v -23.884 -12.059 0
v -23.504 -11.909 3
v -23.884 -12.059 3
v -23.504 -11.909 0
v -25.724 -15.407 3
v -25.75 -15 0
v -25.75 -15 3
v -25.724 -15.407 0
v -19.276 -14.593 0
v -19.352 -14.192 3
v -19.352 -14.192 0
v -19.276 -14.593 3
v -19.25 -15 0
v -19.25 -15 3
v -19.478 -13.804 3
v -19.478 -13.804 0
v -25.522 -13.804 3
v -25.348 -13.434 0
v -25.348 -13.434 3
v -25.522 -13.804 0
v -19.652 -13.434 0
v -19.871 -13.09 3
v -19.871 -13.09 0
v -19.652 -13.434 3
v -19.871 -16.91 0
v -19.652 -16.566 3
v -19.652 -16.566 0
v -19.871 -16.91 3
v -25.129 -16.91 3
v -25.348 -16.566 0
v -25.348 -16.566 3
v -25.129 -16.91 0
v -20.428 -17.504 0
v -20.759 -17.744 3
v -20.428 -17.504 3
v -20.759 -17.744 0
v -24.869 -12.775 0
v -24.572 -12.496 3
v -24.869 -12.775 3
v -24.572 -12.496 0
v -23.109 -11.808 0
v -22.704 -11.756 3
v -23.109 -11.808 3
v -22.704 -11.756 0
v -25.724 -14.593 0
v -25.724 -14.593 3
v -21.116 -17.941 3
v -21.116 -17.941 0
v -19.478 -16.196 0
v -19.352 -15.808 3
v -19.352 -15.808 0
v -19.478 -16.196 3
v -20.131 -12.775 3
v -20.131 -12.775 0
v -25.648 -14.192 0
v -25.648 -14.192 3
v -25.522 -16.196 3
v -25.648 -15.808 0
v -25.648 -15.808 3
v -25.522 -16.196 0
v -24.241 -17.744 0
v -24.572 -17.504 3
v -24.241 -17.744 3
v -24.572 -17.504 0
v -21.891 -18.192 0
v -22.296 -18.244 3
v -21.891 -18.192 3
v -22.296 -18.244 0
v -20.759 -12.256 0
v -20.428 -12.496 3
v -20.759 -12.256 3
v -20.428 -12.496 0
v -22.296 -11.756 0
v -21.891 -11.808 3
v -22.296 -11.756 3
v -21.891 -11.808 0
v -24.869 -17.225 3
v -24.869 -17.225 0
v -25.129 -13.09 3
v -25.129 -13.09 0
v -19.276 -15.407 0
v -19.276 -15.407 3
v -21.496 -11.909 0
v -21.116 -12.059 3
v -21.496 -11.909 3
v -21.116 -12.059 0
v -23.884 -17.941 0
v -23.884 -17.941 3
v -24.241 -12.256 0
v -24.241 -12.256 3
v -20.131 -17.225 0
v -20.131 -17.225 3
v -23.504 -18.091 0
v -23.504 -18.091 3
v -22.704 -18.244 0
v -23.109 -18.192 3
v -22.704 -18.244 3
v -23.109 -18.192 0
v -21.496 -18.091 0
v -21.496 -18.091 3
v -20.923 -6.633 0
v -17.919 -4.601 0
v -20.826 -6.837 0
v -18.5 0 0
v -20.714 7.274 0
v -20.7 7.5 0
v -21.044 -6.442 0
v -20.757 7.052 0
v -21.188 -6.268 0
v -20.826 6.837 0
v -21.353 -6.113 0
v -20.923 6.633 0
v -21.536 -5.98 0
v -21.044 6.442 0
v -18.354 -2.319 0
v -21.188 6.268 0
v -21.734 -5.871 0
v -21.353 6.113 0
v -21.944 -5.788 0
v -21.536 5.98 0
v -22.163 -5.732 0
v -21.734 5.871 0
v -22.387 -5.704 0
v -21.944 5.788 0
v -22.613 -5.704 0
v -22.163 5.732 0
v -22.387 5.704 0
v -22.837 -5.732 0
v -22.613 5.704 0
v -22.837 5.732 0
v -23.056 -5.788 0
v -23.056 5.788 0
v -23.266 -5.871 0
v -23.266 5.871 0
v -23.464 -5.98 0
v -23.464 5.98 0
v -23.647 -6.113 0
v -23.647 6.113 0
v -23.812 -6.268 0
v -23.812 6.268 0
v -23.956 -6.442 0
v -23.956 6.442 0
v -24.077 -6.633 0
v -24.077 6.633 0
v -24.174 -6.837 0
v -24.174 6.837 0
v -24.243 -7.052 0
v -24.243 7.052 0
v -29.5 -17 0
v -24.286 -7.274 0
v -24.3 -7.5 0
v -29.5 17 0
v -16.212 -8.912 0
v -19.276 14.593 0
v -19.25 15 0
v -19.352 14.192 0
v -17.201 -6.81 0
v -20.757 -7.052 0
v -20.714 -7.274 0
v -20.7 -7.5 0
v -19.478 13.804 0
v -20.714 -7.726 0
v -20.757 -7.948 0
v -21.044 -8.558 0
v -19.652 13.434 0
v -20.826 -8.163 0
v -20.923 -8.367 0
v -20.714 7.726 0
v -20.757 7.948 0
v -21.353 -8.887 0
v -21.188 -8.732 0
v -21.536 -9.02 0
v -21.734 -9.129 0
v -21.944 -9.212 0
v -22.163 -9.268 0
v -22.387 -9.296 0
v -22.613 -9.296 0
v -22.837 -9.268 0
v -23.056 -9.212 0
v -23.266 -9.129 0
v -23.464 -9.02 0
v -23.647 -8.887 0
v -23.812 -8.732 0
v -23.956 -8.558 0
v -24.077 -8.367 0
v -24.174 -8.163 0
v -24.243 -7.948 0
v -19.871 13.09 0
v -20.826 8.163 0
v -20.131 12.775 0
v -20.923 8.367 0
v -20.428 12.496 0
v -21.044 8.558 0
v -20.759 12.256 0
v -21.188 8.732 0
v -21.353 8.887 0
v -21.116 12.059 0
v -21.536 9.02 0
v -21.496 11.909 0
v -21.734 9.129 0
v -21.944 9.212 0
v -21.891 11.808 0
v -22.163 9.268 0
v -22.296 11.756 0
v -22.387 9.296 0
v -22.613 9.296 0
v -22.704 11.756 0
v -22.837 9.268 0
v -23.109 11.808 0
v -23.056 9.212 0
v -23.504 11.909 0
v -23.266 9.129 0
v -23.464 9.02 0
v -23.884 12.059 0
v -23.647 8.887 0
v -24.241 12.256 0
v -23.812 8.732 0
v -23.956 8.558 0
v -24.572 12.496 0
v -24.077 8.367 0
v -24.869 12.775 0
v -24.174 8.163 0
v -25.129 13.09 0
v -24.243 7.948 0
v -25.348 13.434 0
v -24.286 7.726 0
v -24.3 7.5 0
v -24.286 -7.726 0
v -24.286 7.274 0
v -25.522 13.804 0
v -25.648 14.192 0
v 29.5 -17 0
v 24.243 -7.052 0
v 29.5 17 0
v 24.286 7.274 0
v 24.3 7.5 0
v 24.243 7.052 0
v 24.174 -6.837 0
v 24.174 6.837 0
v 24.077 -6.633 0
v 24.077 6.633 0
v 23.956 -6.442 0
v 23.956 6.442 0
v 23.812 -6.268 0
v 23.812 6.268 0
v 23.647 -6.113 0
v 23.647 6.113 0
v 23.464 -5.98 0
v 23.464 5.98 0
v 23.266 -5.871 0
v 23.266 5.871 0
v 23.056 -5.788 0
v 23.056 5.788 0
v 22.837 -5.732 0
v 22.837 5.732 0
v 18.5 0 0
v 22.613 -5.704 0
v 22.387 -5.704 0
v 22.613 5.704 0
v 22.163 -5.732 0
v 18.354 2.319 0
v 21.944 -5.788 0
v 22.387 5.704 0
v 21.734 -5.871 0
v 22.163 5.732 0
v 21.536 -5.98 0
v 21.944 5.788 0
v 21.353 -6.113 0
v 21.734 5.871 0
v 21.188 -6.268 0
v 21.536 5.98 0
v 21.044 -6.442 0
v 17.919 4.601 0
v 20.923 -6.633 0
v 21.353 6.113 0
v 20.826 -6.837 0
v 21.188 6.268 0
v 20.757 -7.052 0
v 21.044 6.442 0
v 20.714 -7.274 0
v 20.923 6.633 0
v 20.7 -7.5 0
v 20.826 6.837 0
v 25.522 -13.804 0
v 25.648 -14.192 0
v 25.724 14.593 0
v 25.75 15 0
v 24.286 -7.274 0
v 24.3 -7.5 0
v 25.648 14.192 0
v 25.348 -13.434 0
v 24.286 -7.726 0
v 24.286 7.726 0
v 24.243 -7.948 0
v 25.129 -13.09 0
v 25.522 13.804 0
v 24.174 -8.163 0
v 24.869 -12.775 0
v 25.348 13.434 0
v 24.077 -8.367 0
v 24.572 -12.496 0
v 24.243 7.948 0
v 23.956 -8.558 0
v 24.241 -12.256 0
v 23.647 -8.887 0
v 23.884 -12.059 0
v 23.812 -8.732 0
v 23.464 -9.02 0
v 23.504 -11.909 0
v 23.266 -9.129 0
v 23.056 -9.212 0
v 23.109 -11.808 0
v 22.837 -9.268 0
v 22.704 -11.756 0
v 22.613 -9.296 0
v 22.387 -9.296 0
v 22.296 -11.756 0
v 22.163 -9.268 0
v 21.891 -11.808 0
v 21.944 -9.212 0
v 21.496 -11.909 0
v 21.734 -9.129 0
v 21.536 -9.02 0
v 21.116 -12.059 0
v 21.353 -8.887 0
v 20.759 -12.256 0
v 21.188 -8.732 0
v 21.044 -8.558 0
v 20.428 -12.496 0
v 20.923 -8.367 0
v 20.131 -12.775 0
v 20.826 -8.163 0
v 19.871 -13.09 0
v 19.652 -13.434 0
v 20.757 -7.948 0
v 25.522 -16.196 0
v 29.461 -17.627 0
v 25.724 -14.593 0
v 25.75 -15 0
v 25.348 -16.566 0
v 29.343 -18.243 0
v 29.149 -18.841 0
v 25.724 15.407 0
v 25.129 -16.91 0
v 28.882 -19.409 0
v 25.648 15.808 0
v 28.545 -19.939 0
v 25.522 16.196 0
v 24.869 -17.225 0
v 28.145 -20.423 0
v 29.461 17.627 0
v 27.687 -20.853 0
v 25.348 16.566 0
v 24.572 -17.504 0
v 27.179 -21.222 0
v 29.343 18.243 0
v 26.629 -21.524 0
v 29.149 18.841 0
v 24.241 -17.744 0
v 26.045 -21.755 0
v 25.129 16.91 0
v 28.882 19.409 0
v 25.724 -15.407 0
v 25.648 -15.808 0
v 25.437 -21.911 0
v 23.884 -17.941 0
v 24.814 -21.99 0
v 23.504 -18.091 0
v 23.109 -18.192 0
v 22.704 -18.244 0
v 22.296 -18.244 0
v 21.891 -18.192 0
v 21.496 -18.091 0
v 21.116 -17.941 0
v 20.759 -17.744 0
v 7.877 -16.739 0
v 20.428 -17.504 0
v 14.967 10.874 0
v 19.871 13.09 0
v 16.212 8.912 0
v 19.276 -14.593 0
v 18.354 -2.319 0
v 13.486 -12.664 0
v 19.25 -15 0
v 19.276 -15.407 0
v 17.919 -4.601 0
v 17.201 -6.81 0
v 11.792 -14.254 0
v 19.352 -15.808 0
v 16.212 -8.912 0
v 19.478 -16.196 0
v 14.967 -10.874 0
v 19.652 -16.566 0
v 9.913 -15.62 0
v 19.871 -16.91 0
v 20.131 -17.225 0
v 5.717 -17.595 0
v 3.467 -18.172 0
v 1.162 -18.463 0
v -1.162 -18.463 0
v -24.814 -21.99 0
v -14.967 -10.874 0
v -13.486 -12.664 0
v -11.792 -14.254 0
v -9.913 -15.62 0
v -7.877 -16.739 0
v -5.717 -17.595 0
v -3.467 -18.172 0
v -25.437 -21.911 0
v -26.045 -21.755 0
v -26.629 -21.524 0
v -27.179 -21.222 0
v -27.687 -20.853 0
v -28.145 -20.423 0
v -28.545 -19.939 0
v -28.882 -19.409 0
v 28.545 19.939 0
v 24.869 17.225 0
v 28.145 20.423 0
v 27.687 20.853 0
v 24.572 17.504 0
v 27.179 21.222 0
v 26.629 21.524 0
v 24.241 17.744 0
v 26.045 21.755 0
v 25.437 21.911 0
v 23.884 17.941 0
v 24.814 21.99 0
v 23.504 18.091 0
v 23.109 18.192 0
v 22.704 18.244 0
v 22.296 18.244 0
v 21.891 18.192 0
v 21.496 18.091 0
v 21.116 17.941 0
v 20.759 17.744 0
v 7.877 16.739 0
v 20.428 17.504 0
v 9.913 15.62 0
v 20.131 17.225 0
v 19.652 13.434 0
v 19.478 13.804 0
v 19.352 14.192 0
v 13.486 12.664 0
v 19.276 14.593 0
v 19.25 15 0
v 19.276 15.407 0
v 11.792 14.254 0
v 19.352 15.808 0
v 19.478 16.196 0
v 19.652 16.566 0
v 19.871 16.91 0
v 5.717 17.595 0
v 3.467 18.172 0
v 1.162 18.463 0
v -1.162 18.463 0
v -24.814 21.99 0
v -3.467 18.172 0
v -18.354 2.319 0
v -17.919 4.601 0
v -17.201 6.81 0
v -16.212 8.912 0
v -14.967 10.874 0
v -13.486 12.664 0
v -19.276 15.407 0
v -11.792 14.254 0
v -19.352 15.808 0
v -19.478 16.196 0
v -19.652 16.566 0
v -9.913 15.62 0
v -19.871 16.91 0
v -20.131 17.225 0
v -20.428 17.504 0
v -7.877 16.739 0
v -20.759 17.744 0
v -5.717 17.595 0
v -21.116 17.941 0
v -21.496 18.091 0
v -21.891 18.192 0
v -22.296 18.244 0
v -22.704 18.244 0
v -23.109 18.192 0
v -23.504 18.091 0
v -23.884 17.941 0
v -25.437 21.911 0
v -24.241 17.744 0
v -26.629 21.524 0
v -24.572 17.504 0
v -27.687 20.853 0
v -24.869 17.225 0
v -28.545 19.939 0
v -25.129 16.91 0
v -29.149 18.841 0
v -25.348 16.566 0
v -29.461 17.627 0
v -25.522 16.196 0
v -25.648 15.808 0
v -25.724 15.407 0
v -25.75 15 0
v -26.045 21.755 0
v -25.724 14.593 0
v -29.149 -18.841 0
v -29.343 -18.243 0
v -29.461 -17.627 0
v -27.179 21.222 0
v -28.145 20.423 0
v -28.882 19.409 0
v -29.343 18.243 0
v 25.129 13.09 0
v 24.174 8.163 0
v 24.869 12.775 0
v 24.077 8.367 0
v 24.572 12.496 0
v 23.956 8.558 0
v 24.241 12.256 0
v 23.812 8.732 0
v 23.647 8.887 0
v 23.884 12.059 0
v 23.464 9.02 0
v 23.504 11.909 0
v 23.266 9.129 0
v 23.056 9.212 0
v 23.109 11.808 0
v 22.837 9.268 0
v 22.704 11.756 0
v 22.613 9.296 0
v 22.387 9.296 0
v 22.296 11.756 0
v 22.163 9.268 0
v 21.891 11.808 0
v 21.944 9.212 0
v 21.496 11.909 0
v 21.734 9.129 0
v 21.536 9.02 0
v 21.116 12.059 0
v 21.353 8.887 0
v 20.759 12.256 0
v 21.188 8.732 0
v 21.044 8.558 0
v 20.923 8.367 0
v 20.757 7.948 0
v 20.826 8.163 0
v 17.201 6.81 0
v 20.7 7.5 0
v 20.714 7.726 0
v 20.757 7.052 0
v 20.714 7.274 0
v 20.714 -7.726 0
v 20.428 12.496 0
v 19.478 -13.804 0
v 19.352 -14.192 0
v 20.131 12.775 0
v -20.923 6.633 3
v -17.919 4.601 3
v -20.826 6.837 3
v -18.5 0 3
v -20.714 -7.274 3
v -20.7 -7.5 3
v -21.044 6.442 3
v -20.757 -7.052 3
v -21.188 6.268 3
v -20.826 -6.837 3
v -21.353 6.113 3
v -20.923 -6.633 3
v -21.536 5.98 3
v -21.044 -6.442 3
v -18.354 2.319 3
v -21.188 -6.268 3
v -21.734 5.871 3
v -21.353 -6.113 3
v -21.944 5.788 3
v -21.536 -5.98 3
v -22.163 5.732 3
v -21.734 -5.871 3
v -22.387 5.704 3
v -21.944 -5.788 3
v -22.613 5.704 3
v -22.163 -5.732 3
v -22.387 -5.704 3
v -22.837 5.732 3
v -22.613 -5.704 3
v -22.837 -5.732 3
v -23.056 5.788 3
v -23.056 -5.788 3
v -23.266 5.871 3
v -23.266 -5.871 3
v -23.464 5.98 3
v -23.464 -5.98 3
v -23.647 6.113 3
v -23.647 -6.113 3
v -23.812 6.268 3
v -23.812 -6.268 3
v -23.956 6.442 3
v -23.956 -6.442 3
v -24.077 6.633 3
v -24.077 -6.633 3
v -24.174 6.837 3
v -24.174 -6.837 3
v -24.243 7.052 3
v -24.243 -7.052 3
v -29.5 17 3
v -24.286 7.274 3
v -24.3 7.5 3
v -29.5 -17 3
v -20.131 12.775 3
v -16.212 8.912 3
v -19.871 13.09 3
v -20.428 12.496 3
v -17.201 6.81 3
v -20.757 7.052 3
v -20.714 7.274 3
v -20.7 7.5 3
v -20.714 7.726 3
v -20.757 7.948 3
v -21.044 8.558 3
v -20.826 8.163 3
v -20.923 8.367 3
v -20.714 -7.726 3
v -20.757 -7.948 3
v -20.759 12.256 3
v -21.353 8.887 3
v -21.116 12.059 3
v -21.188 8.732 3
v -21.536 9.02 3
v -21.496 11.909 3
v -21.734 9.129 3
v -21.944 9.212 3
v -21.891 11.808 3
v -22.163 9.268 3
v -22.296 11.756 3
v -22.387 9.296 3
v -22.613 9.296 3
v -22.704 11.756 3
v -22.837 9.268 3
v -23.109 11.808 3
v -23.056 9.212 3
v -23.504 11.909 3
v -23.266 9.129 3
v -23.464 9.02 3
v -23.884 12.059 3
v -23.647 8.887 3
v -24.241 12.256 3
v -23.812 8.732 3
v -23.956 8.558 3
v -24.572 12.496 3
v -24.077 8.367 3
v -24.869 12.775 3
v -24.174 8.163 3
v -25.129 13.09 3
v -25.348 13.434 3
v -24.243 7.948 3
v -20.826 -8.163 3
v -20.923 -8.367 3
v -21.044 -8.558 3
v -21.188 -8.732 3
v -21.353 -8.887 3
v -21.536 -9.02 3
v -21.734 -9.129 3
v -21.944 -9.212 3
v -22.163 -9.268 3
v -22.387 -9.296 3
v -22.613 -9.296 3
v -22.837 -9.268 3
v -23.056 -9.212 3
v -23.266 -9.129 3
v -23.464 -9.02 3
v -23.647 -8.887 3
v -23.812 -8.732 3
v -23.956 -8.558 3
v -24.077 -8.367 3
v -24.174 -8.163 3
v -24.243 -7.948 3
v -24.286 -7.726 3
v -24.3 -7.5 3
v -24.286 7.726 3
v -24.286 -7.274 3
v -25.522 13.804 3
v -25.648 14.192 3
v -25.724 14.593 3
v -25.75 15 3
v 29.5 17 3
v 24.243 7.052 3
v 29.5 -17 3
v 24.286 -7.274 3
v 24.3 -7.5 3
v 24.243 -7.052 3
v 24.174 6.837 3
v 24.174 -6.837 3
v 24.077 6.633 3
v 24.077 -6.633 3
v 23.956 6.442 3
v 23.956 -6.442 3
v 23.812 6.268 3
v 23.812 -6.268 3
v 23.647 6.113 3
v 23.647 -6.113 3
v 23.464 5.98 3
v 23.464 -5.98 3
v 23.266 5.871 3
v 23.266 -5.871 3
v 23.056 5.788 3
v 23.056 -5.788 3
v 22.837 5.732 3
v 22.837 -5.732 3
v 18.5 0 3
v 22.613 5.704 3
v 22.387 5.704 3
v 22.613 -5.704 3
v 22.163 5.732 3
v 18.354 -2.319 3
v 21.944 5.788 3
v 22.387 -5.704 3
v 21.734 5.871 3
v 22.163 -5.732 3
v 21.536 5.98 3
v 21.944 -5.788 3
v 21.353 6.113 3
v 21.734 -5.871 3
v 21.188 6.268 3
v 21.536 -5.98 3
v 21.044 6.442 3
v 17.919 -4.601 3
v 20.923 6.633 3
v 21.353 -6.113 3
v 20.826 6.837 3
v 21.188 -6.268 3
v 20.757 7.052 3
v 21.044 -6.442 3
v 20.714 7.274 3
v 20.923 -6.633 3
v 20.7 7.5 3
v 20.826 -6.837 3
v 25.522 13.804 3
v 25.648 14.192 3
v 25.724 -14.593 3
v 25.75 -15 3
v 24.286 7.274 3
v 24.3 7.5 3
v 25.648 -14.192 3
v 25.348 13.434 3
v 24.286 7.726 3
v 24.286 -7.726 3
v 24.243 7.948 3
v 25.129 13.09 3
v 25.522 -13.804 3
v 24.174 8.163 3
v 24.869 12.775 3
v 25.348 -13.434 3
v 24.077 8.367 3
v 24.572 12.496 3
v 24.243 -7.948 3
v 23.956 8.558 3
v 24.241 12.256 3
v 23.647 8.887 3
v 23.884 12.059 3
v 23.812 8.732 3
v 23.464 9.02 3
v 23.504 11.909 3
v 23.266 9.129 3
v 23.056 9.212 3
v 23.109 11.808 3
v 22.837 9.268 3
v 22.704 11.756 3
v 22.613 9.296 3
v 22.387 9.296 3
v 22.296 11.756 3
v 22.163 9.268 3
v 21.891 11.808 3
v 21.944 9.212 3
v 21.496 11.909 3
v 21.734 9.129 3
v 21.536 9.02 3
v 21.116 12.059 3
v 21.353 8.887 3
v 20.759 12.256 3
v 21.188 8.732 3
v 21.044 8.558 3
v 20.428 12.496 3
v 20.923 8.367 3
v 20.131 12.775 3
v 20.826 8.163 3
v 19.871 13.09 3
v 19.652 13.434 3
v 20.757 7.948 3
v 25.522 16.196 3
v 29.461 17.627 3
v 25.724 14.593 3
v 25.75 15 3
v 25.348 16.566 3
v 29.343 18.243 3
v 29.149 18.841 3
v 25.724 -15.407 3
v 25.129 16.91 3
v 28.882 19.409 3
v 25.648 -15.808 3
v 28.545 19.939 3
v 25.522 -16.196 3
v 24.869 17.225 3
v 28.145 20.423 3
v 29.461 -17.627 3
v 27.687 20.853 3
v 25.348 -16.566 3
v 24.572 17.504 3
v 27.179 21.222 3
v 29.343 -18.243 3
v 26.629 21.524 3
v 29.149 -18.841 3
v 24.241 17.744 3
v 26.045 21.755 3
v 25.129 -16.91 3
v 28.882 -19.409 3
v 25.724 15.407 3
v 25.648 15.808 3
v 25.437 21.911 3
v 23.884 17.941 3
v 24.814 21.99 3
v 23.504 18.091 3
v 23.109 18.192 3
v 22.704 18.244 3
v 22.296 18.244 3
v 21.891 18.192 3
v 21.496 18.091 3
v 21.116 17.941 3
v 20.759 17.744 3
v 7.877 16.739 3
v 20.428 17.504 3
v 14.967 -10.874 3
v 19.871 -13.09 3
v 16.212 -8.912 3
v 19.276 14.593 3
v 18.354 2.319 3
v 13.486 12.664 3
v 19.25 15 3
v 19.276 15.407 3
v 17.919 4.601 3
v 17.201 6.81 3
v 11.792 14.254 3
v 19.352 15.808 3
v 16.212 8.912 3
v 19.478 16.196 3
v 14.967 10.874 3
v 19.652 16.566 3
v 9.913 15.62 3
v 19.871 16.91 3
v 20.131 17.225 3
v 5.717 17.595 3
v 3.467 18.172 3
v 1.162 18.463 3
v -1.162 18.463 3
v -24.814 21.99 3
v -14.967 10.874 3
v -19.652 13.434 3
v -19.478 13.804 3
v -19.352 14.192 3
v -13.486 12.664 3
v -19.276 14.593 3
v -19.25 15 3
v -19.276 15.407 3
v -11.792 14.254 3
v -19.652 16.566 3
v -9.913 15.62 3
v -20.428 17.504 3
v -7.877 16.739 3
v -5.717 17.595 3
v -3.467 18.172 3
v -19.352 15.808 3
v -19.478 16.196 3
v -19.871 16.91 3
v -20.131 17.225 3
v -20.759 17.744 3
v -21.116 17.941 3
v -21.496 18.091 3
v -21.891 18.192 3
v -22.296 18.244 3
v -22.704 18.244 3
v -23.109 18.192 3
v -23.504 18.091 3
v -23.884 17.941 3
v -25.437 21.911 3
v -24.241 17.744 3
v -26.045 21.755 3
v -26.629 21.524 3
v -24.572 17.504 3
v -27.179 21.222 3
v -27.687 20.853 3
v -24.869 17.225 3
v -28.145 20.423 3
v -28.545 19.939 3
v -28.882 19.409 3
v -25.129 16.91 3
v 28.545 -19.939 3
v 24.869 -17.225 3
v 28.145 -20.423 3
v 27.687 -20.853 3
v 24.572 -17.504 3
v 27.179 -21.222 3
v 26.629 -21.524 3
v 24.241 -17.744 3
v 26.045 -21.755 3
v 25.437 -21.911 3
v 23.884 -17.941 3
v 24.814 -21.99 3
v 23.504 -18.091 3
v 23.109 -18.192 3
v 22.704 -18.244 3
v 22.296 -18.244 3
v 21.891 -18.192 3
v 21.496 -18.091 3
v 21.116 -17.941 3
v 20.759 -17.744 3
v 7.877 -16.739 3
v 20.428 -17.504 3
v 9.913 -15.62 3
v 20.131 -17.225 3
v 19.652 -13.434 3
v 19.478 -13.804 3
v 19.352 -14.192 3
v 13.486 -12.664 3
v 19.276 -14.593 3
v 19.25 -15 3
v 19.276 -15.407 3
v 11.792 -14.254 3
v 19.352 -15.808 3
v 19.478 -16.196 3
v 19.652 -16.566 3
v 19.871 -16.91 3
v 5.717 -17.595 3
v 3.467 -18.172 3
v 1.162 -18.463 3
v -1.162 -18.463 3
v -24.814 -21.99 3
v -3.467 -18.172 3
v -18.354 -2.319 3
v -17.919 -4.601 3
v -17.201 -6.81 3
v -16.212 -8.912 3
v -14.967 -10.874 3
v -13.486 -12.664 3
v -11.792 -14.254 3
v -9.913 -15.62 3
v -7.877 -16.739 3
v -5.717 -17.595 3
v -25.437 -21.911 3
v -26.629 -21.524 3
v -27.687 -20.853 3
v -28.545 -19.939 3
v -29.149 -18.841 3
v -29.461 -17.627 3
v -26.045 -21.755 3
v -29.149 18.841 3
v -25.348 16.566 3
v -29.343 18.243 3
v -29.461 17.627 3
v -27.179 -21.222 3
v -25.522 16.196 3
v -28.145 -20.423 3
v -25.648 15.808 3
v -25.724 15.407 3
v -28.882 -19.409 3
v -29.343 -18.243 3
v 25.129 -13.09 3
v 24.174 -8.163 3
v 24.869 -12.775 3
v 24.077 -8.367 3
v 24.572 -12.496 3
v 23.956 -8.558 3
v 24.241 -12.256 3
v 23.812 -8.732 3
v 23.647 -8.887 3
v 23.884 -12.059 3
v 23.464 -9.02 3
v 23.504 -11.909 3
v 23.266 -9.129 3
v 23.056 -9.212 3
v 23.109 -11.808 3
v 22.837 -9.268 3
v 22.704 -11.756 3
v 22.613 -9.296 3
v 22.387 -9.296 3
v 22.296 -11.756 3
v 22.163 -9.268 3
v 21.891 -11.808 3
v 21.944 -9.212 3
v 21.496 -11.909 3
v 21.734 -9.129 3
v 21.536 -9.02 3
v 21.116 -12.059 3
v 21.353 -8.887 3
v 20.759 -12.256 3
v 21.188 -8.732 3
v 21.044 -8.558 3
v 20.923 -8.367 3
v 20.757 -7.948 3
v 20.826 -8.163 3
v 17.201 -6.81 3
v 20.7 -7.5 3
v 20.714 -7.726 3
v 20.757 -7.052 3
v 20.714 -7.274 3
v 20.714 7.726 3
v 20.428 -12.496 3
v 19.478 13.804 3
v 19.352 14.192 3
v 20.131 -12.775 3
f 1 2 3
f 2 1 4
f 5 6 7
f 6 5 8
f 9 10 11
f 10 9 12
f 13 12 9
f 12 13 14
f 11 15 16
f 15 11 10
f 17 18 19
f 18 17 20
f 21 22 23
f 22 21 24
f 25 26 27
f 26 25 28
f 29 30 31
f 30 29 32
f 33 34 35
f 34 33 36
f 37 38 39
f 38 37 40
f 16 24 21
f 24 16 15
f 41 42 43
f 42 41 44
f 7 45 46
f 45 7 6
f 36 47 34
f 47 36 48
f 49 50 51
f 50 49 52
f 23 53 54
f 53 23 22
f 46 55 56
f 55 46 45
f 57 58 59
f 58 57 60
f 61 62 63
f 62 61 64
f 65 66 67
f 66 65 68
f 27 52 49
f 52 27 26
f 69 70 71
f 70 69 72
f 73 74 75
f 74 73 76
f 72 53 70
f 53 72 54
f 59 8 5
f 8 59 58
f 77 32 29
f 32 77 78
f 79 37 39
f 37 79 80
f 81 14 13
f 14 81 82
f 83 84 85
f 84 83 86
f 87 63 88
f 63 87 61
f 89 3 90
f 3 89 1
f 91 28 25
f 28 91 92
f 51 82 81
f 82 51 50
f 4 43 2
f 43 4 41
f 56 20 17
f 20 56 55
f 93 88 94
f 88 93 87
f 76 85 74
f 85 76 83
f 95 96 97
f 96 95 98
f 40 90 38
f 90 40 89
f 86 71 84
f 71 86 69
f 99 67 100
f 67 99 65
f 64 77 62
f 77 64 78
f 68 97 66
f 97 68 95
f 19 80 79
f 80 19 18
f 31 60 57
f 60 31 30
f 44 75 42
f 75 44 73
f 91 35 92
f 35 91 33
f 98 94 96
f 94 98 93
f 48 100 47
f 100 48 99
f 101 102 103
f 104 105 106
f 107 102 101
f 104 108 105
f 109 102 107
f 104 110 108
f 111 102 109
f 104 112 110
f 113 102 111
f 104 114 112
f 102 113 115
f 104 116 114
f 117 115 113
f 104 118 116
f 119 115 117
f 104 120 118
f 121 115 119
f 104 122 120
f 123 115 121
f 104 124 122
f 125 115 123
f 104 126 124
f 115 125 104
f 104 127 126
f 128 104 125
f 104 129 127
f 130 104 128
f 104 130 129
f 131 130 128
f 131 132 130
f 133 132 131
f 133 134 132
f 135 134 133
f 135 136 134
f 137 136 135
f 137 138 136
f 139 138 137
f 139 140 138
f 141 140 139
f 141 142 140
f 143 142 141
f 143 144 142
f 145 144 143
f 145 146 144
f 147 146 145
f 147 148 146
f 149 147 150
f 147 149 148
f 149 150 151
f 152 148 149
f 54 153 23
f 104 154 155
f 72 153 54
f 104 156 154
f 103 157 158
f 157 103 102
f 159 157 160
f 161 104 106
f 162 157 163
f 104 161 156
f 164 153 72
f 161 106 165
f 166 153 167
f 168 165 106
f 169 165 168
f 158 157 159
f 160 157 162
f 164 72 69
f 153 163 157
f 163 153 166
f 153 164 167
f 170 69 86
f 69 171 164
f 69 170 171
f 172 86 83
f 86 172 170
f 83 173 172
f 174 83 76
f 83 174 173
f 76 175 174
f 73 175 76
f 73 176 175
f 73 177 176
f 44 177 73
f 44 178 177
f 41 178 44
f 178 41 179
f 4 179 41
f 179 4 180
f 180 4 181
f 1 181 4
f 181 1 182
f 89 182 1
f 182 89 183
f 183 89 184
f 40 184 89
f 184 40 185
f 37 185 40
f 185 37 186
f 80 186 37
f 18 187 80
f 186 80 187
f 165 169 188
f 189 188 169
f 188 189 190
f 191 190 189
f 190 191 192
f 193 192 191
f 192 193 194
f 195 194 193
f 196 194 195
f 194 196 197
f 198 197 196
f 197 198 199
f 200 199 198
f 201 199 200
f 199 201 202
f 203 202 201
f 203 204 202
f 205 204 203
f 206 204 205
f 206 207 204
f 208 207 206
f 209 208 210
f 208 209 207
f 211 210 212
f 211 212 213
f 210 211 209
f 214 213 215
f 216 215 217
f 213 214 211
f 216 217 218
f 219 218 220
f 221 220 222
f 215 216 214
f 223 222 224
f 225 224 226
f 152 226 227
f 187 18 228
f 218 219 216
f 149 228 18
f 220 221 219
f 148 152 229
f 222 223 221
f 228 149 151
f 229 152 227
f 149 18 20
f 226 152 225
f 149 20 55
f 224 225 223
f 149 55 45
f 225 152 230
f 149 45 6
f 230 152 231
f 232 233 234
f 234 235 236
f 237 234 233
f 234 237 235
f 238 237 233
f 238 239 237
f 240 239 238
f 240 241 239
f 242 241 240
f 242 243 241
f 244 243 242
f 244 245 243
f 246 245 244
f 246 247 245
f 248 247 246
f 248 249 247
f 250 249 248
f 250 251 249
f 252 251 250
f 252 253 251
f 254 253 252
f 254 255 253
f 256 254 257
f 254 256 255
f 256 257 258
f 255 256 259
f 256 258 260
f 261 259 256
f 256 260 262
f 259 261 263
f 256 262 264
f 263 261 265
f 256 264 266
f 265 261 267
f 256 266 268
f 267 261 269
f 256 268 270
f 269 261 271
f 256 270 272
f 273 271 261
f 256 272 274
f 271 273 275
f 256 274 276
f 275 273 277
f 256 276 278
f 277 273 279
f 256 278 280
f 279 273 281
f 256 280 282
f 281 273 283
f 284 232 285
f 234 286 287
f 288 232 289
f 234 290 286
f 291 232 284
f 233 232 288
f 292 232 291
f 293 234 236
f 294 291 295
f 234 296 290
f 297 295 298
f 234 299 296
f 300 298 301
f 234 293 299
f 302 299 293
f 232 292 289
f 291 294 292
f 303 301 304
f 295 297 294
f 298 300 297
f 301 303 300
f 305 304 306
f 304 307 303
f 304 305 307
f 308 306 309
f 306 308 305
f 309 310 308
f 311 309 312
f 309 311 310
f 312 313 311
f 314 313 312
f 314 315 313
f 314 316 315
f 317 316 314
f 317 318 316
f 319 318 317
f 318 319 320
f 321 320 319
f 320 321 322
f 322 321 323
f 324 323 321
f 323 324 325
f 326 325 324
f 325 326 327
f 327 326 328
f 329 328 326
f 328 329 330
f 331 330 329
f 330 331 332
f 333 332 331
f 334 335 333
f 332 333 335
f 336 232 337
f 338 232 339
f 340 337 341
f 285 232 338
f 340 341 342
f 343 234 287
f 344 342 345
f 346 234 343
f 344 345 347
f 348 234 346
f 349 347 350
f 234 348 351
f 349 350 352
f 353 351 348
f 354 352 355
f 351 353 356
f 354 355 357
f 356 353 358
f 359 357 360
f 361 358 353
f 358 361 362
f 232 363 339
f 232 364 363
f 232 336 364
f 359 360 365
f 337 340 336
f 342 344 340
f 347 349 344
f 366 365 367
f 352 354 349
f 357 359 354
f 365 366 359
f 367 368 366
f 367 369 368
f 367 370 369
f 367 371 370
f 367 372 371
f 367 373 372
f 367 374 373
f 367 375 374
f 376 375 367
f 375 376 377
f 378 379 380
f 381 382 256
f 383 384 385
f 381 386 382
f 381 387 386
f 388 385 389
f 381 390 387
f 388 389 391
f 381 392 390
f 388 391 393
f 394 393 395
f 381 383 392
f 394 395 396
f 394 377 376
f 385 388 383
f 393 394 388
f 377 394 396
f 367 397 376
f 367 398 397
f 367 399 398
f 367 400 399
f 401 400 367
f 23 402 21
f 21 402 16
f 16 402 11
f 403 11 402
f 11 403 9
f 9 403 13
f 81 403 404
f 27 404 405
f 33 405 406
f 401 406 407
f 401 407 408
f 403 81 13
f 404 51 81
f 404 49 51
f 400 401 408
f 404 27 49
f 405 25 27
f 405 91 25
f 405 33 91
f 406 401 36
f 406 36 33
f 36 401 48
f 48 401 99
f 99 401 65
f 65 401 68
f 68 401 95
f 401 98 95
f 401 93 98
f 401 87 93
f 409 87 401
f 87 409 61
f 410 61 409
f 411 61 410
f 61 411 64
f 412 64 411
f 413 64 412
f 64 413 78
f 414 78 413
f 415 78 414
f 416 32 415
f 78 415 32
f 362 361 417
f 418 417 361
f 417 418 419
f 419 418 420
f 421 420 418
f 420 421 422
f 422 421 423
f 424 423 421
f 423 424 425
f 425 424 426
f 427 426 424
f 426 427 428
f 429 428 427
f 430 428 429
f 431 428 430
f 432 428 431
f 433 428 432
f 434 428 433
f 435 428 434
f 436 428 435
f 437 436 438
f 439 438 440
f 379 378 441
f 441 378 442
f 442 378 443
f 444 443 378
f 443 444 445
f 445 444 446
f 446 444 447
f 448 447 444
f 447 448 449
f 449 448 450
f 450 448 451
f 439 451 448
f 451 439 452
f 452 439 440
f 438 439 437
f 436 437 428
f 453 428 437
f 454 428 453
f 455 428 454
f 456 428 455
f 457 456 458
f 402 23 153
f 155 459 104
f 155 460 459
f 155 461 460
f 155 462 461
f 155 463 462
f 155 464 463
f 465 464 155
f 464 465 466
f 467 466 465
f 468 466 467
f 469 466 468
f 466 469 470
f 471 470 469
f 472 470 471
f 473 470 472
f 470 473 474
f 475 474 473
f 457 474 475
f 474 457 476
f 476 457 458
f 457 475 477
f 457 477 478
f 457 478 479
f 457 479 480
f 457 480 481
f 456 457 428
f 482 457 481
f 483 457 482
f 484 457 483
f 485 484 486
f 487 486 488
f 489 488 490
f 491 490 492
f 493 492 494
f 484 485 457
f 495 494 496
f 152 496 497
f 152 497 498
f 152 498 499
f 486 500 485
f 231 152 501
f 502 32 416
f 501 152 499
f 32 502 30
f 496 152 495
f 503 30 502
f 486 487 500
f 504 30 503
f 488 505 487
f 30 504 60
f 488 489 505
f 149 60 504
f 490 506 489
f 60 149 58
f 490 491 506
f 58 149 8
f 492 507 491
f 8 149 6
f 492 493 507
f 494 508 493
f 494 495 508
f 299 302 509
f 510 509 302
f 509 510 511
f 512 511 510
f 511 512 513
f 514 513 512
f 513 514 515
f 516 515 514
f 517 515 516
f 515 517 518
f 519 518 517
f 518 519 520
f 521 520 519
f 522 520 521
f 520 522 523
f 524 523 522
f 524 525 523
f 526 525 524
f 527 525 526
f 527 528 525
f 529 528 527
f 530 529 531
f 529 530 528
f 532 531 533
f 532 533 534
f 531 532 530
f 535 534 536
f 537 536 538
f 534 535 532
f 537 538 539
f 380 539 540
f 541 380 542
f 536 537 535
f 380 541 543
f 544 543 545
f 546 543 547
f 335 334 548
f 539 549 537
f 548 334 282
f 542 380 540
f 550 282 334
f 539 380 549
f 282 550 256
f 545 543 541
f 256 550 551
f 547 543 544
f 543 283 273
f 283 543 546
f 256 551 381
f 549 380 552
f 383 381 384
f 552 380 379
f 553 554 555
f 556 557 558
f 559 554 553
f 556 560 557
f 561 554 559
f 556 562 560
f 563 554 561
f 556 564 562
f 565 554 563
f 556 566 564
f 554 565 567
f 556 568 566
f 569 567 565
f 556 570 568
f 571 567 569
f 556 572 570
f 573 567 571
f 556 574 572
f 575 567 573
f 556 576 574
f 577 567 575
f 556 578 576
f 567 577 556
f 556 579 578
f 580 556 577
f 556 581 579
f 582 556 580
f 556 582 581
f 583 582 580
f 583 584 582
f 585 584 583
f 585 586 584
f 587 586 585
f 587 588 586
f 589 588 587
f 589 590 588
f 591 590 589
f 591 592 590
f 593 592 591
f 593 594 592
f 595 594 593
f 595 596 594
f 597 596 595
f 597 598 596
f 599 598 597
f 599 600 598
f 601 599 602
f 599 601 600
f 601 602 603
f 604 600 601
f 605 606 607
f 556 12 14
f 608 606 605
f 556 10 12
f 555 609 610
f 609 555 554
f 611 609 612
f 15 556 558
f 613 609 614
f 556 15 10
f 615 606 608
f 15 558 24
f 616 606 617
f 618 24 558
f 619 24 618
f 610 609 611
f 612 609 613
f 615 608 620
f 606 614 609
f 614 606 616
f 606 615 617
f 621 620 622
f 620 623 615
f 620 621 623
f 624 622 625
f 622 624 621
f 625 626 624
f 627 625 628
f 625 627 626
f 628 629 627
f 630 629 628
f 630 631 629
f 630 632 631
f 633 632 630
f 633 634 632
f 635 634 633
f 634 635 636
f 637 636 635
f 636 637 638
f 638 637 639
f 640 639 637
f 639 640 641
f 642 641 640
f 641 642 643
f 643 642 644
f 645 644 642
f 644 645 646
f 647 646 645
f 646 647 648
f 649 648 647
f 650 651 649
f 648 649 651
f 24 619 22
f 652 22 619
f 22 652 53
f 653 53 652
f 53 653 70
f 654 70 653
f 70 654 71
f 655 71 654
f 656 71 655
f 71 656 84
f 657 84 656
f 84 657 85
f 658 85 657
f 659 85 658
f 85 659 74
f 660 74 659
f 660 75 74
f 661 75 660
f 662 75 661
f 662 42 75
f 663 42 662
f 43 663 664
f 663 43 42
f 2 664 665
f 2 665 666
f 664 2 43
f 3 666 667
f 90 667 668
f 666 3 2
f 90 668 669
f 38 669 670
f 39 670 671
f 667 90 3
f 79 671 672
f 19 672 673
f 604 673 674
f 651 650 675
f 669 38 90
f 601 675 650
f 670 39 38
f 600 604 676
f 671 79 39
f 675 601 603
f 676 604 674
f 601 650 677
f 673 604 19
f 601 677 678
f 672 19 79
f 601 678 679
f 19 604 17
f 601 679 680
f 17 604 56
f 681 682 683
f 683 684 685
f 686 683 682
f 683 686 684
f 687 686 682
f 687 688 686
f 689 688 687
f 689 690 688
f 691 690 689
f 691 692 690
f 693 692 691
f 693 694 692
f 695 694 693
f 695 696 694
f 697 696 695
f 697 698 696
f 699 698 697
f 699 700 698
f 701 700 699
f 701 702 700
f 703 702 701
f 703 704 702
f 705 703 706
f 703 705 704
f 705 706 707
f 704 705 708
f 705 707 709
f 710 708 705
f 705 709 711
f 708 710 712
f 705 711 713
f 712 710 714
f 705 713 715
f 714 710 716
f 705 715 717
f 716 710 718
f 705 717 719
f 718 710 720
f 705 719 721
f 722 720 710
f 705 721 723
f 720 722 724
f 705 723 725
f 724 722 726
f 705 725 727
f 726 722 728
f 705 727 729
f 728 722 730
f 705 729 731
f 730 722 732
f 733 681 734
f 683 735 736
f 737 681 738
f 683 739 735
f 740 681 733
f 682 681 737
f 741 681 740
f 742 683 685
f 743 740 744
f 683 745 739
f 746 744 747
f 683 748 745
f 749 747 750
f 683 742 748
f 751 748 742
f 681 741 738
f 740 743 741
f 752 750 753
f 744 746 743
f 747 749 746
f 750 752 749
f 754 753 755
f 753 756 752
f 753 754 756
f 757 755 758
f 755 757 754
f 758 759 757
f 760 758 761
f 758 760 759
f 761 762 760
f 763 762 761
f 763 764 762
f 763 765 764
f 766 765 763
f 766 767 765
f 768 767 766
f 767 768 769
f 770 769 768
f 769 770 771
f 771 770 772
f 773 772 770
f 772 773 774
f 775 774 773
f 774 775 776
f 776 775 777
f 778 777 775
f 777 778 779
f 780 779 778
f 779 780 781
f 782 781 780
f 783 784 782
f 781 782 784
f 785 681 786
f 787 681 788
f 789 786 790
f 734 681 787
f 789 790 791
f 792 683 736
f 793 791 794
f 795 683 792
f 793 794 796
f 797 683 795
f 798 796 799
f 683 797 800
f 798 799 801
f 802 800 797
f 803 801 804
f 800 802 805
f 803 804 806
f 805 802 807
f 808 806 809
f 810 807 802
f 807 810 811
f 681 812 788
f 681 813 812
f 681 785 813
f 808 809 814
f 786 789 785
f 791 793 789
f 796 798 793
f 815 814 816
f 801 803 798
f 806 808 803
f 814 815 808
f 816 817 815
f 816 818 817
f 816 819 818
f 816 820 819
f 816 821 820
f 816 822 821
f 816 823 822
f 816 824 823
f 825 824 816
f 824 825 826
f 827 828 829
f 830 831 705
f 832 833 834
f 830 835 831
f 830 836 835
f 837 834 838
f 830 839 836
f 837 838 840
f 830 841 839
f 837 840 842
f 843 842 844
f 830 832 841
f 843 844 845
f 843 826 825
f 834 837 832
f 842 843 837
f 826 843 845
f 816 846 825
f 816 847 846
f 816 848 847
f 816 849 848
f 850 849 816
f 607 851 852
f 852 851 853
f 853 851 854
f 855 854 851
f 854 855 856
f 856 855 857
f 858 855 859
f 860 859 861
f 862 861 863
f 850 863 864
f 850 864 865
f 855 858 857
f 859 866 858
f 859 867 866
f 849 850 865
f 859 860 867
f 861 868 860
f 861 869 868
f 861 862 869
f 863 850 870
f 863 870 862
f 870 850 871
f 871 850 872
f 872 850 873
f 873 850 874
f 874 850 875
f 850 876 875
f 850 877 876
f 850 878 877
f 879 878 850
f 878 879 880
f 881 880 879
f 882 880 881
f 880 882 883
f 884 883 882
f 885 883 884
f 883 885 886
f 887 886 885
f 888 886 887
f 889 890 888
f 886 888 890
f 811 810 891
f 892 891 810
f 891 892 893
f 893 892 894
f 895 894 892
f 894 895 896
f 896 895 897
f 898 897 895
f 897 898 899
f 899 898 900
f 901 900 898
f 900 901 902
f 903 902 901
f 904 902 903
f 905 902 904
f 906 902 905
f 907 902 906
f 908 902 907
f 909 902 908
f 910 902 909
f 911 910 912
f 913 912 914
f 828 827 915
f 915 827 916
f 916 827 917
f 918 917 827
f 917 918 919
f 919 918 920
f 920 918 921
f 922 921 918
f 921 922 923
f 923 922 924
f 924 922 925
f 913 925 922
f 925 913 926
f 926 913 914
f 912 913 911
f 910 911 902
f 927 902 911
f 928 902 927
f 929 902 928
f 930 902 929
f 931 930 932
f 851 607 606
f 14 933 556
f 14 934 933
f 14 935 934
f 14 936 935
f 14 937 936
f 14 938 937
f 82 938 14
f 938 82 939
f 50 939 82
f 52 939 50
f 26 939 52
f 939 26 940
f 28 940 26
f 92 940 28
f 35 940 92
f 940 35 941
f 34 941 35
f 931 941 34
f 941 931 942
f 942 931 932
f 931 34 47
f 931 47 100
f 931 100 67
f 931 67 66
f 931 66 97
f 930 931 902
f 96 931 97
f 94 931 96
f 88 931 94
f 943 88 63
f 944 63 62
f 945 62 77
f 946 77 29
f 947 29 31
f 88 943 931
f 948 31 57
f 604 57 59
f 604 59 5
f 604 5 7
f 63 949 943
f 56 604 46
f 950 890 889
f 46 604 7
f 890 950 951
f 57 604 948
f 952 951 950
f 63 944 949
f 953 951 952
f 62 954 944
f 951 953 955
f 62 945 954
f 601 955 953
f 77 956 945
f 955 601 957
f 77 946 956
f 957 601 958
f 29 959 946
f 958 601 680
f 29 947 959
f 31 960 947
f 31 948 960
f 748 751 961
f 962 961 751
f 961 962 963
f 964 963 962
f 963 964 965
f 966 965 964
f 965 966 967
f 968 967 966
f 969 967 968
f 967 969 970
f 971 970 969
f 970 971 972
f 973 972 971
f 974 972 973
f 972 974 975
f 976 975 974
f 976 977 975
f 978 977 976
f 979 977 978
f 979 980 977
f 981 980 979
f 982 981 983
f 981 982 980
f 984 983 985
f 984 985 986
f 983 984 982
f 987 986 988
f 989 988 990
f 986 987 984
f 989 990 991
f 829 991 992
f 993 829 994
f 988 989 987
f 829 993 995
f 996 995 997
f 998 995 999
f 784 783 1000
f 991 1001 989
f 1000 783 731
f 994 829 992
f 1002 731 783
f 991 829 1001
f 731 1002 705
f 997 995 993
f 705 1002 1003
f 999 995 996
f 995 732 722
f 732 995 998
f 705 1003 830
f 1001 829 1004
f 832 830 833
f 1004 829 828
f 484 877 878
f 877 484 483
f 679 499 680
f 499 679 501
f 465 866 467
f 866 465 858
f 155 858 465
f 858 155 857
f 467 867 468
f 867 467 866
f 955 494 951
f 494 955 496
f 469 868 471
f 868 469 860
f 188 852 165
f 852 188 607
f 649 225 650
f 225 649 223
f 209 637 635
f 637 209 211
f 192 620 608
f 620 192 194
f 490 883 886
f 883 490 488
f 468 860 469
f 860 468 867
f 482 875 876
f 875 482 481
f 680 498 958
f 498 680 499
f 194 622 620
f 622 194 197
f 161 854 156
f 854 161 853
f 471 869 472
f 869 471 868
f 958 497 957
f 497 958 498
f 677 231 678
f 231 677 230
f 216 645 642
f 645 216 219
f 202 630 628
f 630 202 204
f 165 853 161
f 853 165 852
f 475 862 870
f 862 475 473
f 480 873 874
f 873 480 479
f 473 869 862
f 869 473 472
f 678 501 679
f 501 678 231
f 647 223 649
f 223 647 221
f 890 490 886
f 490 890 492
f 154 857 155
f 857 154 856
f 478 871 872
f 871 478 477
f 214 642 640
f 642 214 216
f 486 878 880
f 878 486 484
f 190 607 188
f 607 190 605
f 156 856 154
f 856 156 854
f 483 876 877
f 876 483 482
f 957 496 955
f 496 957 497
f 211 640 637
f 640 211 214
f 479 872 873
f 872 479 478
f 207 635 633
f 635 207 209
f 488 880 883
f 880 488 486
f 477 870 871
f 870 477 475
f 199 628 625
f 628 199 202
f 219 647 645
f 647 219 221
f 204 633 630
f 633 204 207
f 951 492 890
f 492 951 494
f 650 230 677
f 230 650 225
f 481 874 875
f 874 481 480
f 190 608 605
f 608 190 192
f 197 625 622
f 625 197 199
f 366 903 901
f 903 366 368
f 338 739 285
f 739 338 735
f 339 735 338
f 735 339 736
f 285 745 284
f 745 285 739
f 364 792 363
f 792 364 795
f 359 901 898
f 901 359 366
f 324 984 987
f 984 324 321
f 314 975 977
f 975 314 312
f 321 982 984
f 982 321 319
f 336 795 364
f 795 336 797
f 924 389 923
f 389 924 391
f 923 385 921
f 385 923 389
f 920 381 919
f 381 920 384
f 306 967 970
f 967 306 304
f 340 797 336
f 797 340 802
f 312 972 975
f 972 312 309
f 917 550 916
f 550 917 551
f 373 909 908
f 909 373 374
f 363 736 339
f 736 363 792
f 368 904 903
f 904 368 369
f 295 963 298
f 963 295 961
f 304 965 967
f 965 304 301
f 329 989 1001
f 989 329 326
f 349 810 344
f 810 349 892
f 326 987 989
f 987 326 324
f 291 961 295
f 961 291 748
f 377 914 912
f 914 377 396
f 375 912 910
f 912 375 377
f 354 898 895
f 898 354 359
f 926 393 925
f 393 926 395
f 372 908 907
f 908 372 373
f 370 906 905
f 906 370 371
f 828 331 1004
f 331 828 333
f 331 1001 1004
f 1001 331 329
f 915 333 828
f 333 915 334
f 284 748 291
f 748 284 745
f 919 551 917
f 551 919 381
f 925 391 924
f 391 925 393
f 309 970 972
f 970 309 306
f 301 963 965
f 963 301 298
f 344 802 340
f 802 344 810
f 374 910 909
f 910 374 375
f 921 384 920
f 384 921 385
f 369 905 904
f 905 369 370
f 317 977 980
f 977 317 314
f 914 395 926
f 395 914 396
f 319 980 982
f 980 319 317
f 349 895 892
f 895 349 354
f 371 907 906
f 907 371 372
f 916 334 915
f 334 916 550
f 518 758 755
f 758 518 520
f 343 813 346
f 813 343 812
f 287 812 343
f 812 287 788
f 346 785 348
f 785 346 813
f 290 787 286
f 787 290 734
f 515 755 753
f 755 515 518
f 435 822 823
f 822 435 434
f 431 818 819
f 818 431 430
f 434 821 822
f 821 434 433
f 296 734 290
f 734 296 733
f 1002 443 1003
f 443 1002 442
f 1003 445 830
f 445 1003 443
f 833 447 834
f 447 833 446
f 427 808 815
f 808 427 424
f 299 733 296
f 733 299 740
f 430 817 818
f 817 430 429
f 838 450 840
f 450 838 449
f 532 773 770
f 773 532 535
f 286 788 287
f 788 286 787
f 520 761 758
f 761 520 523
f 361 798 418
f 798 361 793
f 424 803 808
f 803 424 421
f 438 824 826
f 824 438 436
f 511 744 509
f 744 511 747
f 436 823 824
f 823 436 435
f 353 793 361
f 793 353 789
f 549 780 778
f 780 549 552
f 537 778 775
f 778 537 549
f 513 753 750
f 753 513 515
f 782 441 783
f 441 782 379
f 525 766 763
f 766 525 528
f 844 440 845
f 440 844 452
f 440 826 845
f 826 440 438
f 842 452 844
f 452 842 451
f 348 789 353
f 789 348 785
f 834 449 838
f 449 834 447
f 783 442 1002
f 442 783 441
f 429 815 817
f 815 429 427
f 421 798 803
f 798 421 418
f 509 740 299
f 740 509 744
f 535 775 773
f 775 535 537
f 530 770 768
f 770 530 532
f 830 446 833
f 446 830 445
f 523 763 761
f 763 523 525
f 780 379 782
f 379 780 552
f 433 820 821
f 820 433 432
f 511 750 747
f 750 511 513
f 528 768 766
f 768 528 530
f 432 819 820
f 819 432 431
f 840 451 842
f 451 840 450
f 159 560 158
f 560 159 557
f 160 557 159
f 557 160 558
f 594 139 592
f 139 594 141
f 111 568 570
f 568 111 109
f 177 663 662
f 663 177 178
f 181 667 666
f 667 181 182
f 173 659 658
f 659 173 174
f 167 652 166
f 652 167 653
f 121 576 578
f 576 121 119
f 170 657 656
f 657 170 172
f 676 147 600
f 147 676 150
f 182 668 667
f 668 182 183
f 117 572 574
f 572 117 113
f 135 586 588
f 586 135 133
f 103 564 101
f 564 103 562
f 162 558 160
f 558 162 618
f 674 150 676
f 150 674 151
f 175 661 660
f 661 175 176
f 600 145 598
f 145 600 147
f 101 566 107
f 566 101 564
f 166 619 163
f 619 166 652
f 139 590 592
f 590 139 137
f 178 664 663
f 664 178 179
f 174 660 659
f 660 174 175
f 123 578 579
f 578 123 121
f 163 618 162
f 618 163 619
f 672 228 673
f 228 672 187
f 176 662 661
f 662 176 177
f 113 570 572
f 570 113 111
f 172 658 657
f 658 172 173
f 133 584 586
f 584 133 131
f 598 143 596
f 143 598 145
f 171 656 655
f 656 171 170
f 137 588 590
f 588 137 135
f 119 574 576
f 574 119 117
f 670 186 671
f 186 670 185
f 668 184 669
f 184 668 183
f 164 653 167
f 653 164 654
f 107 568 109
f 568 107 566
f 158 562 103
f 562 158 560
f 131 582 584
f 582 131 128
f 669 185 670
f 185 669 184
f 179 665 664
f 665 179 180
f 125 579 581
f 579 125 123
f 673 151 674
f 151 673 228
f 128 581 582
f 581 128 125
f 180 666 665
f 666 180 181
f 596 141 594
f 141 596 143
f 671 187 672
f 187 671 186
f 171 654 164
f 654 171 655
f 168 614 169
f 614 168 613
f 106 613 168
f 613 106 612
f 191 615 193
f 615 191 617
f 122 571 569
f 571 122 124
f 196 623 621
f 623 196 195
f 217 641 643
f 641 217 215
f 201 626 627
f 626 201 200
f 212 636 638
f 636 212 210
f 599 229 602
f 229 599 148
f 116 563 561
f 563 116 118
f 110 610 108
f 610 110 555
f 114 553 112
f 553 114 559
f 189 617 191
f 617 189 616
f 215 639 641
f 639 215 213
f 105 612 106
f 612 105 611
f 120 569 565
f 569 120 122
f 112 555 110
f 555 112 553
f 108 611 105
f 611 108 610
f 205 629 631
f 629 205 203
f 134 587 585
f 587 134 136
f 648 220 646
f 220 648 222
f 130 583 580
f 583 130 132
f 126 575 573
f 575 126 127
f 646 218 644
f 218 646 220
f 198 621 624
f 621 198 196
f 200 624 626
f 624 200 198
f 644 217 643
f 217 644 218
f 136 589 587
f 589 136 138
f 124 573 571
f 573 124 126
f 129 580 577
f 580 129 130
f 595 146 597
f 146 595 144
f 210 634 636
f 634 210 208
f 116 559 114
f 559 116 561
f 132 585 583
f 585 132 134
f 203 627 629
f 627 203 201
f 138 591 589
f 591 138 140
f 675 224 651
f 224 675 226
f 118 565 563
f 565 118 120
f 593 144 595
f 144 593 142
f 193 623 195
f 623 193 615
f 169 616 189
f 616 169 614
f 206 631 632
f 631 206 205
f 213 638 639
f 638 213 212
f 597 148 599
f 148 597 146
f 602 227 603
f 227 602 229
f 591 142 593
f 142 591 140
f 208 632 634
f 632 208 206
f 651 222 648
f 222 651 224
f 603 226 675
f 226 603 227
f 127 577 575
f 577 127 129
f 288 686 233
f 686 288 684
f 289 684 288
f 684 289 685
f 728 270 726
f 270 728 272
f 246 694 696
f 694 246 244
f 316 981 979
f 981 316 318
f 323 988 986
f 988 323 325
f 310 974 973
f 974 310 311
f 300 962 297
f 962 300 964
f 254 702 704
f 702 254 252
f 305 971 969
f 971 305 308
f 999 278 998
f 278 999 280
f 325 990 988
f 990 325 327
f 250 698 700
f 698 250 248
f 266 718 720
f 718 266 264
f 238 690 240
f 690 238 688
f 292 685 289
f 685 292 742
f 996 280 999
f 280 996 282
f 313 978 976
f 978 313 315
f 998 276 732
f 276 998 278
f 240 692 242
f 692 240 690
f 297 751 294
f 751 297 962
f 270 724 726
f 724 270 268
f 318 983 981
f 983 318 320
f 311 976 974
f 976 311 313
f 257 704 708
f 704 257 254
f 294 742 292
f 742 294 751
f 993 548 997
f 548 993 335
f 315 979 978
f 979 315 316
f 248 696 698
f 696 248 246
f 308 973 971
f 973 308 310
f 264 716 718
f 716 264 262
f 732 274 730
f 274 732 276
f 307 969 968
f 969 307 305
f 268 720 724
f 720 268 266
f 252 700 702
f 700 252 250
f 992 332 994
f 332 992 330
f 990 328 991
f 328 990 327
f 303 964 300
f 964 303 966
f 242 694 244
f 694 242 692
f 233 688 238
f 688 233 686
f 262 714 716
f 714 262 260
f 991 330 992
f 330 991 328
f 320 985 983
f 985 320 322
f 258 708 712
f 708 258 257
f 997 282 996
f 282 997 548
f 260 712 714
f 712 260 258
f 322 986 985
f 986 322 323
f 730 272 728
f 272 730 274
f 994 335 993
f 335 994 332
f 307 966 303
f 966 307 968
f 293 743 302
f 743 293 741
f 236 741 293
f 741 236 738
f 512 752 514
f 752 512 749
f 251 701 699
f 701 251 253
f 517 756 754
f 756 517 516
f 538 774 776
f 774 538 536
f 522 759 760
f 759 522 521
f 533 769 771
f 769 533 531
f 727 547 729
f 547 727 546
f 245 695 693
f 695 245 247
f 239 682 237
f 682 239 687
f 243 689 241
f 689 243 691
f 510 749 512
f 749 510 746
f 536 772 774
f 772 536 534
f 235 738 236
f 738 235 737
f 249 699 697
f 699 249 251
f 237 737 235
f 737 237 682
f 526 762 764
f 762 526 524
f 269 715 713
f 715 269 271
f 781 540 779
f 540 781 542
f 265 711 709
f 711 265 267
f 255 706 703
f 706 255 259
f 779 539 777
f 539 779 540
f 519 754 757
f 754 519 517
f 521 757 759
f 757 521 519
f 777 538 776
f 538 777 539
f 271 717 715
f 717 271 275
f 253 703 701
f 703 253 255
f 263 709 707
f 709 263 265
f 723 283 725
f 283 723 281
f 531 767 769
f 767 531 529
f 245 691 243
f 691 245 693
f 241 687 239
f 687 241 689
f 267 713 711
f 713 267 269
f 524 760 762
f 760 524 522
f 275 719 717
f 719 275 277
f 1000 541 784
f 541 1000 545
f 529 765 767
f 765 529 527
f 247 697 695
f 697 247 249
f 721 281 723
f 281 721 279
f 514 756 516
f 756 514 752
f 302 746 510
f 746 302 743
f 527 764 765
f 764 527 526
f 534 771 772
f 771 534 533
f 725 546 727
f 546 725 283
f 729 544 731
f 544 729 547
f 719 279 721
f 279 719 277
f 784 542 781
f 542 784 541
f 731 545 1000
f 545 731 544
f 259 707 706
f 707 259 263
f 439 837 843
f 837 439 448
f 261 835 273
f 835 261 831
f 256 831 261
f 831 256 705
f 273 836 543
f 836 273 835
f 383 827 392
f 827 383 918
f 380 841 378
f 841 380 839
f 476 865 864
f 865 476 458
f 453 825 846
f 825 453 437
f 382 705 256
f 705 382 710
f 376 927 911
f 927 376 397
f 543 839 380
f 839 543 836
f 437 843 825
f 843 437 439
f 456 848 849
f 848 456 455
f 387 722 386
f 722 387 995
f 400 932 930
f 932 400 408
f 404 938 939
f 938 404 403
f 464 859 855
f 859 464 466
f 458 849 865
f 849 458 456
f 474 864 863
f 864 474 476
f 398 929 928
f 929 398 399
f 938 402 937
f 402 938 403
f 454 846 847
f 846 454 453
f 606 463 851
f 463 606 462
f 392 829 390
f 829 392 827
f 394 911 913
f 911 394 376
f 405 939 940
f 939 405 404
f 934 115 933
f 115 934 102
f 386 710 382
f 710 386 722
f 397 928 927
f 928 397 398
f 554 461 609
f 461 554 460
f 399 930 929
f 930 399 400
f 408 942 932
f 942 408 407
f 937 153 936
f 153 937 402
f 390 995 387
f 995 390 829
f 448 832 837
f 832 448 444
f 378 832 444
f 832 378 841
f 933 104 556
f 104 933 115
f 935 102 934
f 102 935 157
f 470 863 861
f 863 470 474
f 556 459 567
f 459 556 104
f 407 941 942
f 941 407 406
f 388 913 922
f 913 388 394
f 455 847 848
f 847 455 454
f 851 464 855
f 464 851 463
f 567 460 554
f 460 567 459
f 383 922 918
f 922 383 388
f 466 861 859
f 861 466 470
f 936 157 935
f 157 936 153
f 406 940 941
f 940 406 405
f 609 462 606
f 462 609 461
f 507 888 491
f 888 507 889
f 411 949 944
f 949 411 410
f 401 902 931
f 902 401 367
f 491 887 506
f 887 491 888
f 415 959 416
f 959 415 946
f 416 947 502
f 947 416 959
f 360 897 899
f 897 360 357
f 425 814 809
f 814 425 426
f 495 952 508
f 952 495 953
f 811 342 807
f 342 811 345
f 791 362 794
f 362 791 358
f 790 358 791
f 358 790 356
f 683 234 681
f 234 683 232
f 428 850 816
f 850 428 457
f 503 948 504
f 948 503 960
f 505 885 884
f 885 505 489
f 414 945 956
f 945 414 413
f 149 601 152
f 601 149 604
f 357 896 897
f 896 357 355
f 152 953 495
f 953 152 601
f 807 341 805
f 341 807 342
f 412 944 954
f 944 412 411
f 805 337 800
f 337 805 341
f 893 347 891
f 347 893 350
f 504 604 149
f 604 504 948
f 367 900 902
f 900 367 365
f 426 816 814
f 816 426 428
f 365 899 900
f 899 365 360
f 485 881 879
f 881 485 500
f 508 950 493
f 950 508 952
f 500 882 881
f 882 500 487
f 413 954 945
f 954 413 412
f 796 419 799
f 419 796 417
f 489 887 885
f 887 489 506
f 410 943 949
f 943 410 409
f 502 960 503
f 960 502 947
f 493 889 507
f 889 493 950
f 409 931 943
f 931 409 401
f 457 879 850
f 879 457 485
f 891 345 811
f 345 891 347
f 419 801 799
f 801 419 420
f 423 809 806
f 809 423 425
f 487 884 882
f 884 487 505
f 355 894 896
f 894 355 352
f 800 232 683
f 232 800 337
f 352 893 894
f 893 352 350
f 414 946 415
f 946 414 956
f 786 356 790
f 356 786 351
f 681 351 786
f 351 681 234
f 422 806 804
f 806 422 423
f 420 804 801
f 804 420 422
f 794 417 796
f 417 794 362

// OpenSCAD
$fn = 50;

difference() {
	union() {
		hull() {
			translate(v = [-24.5, 17.0, 0]) {
				cylinder(h = 3, r = 5);
			}
			translate(v = [24.5, 17.0, 0]) {
				cylinder(h = 3, r = 5);
			}
			translate(v = [-24.5, -17.0, 0]) {
				cylinder(h = 3, r = 5);
			}
			translate(v = [24.5, -17.0, 0]) {
				cylinder(h = 3, r = 5);
			}
		}
	}
	union() {
		translate(v = [-22.5, -15.0, 0]) {
			cylinder(h = 3, r = 3.25);
		}
		translate(v = [-22.5, 15.0, 0]) {
			cylinder(h = 3, r = 3.25);
		}
		translate(v = [22.5, -15.0, 0]) {
			cylinder(h = 3, r = 3.25);
		}
		translate(v = [22.5, 15.0, 0]) {
			cylinder(h = 3, r = 3.25);
		}
		translate(v = [-22.5, -7.5, 0]) {
			cylinder(h = 3, r = 1.8);
		}
		translate(v = [-22.5, 7.5, 0]) {
			cylinder(h = 3, r = 1.8);
		}
		translate(v = [22.5, -7.5, 0]) {
			cylinder(h = 3, r = 1.8);
		}
		translate(v = [22.5, 7.5, 0]) {
			cylinder(h = 3, r = 1.8);
		}
		cylinder(h = 3, r = 18.5);
	}
}
